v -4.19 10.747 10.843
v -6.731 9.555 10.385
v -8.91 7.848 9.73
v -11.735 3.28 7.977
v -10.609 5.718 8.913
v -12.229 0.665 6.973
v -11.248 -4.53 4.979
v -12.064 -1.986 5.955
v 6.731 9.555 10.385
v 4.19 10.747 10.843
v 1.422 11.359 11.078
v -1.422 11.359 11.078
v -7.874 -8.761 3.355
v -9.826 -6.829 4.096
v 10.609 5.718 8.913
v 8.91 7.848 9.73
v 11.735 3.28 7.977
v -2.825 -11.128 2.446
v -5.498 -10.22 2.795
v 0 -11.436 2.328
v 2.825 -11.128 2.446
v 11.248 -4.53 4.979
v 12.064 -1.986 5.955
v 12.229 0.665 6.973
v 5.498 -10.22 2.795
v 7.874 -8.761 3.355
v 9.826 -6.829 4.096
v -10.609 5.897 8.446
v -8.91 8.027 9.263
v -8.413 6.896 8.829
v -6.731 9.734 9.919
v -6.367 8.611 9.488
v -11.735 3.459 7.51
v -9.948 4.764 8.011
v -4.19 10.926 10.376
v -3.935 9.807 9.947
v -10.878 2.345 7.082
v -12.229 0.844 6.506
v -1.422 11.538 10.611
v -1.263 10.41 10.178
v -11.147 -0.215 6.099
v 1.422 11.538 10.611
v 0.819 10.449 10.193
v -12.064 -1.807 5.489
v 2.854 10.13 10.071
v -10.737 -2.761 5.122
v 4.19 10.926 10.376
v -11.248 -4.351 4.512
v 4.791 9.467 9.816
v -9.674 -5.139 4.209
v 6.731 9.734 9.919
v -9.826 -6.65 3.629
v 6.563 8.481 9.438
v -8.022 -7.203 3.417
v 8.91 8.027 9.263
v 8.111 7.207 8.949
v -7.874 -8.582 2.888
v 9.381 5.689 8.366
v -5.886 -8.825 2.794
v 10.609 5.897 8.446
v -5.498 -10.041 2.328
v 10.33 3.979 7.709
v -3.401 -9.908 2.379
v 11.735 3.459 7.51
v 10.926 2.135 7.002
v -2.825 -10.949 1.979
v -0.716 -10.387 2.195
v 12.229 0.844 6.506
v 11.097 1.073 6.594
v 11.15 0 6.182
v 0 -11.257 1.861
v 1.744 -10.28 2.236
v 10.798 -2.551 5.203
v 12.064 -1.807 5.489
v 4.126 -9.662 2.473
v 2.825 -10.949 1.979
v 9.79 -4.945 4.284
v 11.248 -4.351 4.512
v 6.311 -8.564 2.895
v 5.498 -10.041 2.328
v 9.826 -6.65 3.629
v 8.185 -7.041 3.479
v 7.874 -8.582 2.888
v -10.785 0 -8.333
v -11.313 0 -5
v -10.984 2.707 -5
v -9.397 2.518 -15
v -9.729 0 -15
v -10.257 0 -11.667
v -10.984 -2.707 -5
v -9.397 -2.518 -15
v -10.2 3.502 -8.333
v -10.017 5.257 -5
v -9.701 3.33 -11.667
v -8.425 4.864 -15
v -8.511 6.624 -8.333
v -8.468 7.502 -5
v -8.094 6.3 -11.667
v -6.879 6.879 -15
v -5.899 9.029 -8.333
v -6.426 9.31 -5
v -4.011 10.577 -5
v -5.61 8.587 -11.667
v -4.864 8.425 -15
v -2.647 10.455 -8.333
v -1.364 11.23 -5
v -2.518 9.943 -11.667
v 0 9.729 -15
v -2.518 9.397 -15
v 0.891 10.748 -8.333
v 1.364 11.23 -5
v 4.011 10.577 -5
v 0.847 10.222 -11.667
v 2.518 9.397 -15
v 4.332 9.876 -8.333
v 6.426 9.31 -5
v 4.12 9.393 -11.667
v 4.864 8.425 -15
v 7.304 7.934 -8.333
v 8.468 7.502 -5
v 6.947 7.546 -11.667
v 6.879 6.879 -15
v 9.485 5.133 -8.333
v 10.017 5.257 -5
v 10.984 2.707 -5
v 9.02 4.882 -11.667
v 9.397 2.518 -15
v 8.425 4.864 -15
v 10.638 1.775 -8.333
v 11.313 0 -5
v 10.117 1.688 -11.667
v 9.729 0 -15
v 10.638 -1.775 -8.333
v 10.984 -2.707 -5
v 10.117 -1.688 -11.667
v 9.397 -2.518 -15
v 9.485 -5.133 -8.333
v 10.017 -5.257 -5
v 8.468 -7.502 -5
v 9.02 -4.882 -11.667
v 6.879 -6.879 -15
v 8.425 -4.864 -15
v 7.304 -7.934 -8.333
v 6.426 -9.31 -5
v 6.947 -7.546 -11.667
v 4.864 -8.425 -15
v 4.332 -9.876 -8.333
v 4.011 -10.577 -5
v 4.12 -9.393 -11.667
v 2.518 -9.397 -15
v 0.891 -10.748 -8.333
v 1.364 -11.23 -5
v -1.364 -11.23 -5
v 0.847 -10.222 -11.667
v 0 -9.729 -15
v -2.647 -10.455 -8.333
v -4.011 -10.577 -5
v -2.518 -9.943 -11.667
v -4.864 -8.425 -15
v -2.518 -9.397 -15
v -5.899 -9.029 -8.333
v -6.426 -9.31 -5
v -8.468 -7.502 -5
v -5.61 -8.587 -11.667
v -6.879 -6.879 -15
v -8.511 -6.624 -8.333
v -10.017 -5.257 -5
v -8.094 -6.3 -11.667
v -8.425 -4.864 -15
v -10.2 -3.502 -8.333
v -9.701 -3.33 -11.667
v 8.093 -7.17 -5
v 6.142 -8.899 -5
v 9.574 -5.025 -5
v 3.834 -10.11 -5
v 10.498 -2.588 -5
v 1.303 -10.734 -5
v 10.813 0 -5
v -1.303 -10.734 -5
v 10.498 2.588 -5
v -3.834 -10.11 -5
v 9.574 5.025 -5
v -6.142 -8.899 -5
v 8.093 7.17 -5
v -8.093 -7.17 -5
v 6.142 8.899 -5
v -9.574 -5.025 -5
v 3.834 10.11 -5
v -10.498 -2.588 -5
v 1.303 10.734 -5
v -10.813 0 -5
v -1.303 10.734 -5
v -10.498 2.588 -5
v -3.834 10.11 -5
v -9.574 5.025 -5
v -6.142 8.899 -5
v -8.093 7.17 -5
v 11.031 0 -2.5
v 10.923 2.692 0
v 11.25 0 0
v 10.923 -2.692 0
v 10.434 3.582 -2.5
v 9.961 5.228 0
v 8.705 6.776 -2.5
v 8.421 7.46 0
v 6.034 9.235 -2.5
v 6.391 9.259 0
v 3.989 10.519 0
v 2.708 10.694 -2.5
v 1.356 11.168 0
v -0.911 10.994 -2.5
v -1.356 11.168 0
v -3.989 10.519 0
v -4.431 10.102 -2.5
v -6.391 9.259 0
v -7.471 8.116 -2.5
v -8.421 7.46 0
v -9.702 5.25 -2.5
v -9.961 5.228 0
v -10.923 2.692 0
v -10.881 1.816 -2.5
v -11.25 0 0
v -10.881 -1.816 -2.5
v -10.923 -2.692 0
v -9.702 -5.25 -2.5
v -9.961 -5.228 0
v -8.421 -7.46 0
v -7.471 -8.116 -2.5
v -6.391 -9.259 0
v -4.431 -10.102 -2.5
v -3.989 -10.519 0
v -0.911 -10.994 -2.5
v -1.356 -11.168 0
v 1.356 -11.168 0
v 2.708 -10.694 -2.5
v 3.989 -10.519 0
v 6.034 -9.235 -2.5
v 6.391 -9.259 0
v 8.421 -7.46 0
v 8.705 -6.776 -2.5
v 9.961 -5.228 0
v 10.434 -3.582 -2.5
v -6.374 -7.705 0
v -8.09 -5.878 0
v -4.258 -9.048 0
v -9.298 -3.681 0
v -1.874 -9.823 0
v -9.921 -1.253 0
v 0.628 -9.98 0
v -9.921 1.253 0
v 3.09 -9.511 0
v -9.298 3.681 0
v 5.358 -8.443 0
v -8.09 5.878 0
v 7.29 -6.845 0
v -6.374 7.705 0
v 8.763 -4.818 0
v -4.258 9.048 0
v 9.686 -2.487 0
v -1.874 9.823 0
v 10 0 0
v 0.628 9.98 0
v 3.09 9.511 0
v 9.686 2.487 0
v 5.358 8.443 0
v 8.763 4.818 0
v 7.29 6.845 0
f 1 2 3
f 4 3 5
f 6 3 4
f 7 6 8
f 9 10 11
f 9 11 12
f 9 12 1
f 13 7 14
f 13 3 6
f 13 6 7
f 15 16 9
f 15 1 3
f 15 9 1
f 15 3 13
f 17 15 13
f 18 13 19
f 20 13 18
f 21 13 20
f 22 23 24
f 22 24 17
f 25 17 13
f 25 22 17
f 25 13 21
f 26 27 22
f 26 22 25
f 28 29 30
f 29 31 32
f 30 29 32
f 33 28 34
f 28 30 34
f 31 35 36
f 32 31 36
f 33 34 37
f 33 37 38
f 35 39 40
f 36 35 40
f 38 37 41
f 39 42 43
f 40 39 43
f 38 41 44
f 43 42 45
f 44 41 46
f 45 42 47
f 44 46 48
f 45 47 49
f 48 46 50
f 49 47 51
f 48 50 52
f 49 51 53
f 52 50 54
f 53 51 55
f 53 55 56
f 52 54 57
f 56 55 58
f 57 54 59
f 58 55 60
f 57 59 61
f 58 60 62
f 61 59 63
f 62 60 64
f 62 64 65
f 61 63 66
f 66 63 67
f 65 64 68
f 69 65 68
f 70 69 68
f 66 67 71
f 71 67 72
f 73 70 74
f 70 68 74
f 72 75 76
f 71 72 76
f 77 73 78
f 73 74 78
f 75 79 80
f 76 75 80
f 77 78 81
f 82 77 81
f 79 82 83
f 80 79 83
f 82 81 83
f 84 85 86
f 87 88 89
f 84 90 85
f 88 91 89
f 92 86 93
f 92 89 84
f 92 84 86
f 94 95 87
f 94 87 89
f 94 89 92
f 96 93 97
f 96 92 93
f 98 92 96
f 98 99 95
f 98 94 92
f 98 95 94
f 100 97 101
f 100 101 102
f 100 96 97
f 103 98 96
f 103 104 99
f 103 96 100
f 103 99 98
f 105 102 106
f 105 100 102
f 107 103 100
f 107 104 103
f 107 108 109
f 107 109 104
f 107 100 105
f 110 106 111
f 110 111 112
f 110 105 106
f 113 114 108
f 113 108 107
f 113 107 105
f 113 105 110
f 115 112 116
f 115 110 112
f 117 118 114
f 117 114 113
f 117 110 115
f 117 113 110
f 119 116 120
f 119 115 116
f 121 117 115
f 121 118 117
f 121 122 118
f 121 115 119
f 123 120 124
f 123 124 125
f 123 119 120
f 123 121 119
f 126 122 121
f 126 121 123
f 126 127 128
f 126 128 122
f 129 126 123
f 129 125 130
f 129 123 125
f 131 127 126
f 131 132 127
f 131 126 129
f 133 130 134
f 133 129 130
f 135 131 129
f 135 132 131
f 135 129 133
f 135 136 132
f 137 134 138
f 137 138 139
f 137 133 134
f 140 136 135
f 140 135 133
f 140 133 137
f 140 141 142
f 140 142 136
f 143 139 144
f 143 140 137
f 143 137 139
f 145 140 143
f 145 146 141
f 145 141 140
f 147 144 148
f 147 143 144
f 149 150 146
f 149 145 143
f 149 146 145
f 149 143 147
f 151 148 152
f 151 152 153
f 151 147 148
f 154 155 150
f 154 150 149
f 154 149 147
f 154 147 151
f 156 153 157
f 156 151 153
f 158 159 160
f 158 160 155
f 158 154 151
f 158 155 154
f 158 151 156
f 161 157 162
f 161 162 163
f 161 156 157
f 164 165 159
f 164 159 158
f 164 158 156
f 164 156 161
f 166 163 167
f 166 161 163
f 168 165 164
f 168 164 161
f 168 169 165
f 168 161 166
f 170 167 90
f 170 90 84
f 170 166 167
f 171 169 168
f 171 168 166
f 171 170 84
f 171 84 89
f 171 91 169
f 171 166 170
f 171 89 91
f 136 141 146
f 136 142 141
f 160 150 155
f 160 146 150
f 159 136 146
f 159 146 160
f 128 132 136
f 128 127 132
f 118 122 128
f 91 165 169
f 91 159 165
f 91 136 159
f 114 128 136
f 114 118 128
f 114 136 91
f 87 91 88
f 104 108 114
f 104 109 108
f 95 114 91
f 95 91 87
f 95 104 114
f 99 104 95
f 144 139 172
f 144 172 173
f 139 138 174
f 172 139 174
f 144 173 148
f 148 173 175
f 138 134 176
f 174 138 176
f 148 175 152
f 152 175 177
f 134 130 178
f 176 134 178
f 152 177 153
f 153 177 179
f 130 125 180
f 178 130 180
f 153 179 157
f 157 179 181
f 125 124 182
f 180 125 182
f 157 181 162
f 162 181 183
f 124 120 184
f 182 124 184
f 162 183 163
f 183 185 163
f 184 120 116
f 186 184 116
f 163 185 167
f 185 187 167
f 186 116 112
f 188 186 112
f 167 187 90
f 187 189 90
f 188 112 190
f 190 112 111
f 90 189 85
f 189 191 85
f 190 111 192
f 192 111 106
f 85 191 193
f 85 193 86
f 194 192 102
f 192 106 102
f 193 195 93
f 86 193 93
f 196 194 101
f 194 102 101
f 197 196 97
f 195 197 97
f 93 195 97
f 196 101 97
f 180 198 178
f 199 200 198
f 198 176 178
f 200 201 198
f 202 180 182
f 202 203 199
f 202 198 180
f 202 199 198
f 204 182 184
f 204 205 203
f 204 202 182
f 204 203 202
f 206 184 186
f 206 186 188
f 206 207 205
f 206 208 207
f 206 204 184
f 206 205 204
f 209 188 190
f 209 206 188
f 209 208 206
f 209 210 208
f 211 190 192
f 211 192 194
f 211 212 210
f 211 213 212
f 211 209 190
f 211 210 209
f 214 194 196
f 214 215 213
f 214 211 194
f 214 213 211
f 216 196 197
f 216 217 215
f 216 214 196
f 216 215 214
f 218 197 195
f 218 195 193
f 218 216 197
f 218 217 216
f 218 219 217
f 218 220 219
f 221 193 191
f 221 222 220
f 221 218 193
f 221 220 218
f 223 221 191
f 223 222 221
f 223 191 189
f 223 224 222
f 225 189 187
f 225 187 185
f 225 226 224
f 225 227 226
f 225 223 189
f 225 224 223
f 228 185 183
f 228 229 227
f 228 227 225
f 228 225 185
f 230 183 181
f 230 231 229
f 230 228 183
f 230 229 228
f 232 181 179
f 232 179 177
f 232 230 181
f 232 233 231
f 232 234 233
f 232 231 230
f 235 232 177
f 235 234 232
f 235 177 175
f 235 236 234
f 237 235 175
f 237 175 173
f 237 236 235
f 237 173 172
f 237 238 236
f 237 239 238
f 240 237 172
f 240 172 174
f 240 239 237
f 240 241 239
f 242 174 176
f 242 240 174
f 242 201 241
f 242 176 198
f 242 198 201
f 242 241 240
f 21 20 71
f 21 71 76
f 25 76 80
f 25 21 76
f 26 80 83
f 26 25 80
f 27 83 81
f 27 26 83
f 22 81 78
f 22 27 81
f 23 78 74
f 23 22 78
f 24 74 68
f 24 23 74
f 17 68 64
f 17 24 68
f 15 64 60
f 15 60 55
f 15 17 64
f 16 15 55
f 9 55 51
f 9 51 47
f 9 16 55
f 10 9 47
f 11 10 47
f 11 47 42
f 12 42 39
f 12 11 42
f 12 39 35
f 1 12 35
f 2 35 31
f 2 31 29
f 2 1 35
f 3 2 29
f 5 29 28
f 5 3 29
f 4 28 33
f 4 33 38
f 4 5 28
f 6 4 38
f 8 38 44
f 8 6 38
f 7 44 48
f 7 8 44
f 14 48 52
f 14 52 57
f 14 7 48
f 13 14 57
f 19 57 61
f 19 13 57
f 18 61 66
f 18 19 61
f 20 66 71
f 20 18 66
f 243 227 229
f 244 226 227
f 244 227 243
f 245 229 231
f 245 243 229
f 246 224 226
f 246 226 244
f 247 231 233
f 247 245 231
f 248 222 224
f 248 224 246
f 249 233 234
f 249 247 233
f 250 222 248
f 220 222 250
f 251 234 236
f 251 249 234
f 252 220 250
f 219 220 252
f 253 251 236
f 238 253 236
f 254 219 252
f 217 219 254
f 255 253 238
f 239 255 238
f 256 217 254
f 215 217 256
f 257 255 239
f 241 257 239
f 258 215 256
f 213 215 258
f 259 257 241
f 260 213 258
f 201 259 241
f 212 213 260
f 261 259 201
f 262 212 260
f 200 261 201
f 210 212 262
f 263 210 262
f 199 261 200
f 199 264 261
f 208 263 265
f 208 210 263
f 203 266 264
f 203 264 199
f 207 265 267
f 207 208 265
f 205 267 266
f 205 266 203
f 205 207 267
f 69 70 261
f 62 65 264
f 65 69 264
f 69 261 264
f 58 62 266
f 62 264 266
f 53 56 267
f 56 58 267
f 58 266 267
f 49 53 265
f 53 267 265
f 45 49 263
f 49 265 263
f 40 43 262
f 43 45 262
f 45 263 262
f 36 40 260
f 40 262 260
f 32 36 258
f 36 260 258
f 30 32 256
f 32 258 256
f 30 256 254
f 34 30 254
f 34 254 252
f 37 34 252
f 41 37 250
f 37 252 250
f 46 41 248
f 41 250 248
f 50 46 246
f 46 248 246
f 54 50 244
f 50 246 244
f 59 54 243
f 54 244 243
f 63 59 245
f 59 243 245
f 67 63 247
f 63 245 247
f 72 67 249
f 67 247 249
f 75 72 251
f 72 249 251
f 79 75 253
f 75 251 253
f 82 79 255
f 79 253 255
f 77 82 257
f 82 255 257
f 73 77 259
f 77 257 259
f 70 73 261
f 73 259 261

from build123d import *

# Parameters (mm, degrees)
SKETCH1_R           = 11.25
BOSS_EXTRUDE1_DEPTH = 5
BOSS_EXTRUDE1_DRAFT = -5
SKETCH4_R           = 11.312556682
BOSS_EXTRUDE2_DEPTH = 10
BOSS_EXTRUDE2_TAPER = 9
SKETCH3_R           = 11.25
SKETCH1_38_R        = 10
SKETCH3_7_R         = 12.25
BOSS_EXTRUDE4_DEPTH = 0.5


with BuildPart() as part:
    # Sketch1 → Boss-Extrude1 (with draft: the straight prism first)
    with BuildSketch(Plane.XY):
        Circle(SKETCH1_R)
    extrude(amount=-BOSS_EXTRUDE1_DEPTH)
    # Boss-Extrude1: the draft: its side faces are tilted about the plane it starts from
    boss_extrude1_sides = [part.faces().sort_by_distance(p)[0] for p in [
        (-11.25, 0, -2.5),
    ]]
    draft(boss_extrude1_sides, Plane.XY, BOSS_EXTRUDE1_DRAFT)

    # Sketch4 → Boss-Extrude2 (add)
    with BuildSketch(Plane(origin=(0, 0, -5), x_dir=(-1, 0, 0), z_dir=(0, 0, -1))):
        Circle(SKETCH4_R)
    extrude(amount=BOSS_EXTRUDE2_DEPTH, taper=BOSS_EXTRUDE2_TAPER)

    # Sketch3 → Loft2 section 0
    with BuildSketch(Plane(origin=(0, -2.247482777, 5.854892806), x_dir=(1, 0, 0), z_dir=(0, -0.358367949545301, 0.9335804264972015))):
        with Locations((0, 2.407379925)):
            Circle(SKETCH3_R)
    # Sketch1<38> → Loft2 section 1
    with BuildSketch(Plane.XY):
        Circle(SKETCH1_38_R)
    loft()

    # Sketch3<7> → Boss-Extrude4 (add)
    with BuildSketch(Plane(origin=(0, -2.247482777, 5.854892806), x_dir=(1, 0, 0), z_dir=(0, -0.358367949545301, 0.9335804264972015))):
        with Locations(Location((0, 2.407379925, 0), (0, 0, 270))):
            Circle(SKETCH3_7_R)
    extrude(amount=-BOSS_EXTRUDE4_DEPTH)


solid = part.part
